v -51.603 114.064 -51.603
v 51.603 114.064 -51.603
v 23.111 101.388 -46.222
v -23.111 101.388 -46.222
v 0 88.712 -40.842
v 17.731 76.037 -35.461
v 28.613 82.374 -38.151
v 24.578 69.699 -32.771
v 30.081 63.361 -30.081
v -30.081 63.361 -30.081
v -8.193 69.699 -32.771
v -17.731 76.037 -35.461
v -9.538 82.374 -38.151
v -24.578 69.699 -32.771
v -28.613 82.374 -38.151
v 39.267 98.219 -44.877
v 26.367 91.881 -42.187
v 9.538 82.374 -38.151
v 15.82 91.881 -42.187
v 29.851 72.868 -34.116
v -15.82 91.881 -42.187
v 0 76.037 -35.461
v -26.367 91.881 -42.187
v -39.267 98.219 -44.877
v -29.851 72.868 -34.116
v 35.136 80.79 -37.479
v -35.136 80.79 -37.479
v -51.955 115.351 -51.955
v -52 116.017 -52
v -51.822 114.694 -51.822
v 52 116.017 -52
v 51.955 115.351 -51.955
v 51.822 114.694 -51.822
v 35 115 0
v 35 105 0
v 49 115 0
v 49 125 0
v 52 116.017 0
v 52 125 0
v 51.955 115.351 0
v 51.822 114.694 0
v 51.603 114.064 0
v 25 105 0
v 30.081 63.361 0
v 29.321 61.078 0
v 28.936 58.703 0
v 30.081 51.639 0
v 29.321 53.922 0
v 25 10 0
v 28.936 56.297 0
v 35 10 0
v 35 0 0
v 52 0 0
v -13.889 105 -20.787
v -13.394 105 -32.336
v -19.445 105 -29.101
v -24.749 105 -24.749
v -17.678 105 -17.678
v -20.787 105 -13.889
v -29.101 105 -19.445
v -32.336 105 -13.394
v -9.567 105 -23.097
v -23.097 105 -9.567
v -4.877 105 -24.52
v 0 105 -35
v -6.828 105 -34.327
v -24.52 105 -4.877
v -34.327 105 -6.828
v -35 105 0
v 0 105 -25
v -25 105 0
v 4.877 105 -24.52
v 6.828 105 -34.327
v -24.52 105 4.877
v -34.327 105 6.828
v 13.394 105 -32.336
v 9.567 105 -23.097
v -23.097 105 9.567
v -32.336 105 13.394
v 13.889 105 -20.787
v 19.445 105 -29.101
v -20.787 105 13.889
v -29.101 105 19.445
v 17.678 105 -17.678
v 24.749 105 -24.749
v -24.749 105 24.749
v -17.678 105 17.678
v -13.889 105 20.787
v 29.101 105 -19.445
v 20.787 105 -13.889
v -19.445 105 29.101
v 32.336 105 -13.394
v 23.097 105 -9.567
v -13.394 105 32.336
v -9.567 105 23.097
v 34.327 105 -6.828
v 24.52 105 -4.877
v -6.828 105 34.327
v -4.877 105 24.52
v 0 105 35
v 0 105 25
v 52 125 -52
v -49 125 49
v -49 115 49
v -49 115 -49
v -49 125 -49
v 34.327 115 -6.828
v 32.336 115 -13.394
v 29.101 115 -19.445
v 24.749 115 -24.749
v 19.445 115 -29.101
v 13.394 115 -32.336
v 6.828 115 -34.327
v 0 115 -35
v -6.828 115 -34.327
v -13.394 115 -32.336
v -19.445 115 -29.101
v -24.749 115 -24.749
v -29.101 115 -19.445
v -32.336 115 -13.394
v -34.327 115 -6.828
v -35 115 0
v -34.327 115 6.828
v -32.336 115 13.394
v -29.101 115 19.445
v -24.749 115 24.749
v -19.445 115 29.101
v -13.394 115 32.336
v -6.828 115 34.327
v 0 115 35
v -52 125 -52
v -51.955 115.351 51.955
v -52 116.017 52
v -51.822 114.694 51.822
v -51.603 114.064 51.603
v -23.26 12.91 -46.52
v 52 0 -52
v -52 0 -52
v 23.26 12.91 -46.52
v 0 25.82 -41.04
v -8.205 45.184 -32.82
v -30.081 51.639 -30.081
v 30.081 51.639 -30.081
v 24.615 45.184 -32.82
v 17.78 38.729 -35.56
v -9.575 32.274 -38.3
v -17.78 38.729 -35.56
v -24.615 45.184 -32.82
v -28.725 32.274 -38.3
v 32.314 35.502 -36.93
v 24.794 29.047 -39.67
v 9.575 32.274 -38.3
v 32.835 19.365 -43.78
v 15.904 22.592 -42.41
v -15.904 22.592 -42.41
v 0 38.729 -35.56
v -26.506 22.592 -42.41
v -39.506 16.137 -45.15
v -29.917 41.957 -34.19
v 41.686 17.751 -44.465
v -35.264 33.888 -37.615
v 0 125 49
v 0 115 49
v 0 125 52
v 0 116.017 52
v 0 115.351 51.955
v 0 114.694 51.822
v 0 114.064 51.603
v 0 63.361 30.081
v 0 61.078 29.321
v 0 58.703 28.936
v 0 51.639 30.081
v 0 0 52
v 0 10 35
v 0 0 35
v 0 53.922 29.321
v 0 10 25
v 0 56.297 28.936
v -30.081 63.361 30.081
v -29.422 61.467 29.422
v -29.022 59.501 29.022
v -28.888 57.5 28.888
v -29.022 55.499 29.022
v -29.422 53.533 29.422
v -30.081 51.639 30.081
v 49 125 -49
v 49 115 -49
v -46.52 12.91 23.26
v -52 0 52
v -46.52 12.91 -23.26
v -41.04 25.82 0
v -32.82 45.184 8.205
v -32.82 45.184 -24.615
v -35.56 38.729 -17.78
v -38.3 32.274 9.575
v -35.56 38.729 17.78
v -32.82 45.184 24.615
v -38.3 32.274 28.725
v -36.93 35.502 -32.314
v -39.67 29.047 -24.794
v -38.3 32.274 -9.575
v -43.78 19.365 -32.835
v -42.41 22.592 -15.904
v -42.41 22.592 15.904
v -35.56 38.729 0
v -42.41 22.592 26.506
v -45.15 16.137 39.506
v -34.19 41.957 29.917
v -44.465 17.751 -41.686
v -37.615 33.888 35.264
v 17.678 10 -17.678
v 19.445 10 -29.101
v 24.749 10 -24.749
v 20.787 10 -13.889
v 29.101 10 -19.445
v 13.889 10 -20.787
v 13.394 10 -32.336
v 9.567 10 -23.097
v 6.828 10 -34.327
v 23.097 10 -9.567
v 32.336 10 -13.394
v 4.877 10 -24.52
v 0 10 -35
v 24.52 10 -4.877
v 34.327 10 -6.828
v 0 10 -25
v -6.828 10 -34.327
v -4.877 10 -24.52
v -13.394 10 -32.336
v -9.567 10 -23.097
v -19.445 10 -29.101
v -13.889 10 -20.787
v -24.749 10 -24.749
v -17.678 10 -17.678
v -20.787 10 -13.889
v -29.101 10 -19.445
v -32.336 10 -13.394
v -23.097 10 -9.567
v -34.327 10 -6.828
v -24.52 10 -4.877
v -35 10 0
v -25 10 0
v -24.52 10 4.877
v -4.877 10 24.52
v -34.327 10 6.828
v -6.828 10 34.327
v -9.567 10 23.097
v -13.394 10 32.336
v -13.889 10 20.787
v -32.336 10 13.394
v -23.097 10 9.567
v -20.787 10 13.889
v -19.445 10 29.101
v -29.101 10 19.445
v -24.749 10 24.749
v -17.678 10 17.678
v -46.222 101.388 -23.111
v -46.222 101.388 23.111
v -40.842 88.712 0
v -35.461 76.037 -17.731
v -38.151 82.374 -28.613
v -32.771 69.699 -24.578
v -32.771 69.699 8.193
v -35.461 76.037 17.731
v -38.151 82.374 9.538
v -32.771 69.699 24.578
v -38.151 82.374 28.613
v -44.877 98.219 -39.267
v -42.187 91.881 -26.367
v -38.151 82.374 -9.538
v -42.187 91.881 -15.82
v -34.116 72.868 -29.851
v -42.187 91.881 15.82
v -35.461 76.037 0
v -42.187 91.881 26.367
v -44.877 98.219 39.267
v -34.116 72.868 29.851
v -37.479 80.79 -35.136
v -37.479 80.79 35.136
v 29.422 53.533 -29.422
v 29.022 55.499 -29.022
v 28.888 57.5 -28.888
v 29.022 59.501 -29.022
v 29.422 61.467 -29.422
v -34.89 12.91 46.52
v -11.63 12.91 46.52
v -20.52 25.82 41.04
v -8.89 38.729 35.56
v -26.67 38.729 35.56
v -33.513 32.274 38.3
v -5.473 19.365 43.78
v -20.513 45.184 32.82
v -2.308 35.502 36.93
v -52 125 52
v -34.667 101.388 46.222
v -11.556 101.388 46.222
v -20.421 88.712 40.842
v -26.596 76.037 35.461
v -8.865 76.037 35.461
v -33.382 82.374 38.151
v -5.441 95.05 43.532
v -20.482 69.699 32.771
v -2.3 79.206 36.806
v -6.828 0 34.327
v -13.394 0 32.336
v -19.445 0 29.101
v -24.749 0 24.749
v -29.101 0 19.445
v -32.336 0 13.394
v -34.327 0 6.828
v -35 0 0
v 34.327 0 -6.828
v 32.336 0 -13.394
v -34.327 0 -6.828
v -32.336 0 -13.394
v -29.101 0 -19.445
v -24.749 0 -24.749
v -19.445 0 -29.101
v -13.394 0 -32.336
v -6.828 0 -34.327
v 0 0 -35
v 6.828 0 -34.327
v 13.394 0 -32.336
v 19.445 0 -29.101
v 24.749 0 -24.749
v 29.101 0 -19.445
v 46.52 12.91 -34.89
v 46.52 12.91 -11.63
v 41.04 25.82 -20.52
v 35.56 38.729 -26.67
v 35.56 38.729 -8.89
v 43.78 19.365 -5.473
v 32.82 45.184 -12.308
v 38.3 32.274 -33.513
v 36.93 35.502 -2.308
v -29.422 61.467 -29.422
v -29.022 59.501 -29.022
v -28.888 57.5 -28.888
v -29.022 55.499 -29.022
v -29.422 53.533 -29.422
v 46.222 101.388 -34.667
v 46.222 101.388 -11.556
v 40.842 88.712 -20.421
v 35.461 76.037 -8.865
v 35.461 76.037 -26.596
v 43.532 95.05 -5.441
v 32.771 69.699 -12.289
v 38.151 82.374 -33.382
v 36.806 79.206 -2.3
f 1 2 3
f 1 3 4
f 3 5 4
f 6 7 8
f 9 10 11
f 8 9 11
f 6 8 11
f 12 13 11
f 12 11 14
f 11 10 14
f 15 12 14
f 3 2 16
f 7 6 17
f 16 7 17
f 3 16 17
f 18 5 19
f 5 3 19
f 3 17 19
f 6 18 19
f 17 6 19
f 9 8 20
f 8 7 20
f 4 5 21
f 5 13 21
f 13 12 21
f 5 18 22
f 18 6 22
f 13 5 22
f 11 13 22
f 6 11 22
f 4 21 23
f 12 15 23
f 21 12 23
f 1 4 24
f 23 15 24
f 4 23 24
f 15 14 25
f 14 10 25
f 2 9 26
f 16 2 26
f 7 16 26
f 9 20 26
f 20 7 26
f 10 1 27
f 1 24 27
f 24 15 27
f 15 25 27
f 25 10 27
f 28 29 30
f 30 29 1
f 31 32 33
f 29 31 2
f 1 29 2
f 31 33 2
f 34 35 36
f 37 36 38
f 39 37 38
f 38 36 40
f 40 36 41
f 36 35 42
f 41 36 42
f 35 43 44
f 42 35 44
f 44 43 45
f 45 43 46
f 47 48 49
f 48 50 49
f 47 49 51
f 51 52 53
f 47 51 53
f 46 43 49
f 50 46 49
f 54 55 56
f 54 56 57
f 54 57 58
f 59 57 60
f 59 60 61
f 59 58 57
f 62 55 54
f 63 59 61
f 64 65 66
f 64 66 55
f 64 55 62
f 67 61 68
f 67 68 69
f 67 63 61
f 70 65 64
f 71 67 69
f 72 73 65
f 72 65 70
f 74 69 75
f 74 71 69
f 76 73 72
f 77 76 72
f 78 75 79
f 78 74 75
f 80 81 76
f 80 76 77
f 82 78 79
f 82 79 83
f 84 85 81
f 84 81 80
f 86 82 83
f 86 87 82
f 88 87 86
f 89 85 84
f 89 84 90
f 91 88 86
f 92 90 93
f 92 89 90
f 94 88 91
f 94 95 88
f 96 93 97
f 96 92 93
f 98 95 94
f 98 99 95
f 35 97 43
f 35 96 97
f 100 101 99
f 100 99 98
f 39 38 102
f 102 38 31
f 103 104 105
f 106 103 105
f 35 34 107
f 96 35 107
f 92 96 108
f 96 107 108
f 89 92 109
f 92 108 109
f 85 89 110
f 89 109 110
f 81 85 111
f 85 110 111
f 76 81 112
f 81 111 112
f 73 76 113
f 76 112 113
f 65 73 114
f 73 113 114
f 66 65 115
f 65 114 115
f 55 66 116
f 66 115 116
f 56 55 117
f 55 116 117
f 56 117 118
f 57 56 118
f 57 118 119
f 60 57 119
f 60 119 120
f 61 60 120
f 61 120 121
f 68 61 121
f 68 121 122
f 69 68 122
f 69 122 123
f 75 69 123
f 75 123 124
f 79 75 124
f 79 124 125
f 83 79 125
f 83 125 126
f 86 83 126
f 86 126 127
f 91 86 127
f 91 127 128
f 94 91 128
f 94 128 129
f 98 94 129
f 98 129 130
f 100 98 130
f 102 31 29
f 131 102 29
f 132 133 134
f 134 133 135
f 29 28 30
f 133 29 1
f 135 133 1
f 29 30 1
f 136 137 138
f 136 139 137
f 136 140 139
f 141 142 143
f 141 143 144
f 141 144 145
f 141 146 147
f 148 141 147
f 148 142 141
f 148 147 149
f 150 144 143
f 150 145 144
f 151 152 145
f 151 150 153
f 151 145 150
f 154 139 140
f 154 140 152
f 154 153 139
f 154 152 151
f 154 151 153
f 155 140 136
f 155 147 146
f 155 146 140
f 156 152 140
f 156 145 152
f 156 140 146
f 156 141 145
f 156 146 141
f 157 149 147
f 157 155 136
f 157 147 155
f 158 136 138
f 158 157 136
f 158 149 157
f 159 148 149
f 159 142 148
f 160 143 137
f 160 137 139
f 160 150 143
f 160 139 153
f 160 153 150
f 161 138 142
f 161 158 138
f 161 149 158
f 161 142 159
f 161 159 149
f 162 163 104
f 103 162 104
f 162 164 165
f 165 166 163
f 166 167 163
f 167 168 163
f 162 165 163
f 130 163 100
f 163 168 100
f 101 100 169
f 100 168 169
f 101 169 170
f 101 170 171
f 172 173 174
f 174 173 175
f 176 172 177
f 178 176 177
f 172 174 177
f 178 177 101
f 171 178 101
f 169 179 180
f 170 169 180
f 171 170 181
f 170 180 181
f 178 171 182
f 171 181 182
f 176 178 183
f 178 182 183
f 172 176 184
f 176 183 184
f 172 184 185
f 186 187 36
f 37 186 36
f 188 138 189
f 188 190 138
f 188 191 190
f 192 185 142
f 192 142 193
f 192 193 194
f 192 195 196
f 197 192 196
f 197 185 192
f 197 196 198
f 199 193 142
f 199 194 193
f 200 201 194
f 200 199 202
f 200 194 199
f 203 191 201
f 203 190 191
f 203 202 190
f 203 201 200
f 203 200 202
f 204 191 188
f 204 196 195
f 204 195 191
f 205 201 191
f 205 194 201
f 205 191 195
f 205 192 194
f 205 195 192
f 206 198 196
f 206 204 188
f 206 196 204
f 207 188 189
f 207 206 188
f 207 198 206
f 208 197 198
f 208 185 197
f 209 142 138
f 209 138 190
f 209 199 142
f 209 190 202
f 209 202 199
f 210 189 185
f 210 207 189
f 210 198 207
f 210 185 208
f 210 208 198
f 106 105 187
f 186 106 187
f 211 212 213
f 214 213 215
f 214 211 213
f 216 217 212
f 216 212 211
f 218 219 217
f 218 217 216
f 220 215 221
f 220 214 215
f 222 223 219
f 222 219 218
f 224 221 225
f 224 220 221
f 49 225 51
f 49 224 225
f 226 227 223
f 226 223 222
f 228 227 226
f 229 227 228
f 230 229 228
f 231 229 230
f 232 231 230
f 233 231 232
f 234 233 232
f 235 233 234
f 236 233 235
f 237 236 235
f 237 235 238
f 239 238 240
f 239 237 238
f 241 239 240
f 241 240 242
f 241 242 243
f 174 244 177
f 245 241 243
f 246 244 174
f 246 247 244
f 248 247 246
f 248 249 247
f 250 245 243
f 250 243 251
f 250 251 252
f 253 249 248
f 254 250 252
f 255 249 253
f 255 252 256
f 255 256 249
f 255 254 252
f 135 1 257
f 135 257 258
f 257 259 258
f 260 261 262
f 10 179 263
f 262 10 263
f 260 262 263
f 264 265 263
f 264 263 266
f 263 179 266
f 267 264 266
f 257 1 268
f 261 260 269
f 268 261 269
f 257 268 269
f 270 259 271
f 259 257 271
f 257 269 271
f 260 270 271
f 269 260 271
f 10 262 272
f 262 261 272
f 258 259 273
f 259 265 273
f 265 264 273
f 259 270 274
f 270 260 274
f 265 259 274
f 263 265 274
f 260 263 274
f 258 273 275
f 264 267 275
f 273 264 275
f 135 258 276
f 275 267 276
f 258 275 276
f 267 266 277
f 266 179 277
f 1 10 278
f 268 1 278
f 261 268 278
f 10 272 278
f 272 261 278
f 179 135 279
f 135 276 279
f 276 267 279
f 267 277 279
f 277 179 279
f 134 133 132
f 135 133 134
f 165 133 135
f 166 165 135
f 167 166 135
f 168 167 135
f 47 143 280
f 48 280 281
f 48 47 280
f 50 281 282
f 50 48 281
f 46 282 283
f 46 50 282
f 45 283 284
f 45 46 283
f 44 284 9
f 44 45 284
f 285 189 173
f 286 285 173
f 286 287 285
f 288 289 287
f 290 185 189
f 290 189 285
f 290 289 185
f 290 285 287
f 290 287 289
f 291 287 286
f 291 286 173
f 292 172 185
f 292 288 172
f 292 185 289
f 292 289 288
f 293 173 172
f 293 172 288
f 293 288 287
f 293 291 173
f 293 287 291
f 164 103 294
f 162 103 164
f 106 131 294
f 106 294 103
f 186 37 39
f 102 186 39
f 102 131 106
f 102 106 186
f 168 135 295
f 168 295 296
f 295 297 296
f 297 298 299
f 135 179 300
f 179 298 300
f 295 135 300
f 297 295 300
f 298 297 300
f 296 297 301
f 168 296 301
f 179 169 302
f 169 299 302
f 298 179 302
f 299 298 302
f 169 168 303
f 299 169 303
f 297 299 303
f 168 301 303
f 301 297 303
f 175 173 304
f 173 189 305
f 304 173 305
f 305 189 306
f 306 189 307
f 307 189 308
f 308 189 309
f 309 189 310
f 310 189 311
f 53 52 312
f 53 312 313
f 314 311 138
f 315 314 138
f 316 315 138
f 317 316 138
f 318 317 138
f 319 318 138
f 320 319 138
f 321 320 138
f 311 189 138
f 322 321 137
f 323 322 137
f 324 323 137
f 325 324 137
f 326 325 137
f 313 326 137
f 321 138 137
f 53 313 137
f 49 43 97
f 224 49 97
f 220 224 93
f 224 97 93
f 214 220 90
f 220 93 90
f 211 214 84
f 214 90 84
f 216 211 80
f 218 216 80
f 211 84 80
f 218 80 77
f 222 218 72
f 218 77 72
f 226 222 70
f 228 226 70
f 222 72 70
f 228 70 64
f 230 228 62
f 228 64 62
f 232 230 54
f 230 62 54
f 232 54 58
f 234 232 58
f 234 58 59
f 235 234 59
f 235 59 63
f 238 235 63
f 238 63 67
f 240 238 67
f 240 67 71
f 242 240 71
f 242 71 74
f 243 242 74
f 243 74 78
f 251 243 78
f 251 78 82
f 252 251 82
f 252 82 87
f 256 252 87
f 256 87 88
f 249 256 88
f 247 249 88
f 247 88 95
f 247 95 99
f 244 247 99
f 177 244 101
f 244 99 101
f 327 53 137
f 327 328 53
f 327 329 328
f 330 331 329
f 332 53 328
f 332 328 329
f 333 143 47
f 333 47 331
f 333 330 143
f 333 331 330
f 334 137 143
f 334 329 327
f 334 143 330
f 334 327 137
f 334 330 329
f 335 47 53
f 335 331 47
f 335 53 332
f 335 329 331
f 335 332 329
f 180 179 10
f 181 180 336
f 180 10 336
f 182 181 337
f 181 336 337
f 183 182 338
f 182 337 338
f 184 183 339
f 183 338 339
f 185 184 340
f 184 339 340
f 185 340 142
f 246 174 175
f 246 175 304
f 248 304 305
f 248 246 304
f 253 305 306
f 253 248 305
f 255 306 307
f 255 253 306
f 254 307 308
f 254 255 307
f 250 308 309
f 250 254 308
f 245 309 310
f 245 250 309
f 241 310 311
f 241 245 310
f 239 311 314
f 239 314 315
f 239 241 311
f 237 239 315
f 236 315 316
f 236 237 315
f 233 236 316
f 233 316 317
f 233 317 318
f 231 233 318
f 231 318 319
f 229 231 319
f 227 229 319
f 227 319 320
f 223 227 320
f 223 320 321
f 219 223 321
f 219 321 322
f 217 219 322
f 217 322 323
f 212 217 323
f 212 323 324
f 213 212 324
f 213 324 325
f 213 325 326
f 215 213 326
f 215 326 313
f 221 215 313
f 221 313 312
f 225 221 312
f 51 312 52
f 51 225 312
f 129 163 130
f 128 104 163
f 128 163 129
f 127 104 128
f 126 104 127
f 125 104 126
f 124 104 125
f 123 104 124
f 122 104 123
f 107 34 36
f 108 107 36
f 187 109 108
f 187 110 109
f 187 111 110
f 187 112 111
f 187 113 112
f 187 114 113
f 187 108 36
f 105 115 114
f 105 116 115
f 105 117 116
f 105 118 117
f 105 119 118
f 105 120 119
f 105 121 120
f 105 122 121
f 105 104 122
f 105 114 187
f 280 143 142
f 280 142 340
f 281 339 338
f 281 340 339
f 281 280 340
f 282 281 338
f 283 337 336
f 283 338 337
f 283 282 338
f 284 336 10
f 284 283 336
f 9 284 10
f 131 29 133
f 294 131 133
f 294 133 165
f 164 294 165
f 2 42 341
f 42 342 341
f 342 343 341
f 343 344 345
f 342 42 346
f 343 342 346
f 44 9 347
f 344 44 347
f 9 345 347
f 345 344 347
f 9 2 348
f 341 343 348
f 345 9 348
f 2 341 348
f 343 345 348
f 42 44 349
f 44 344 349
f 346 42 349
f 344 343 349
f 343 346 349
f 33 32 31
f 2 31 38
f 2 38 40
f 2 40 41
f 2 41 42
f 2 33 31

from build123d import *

# Parameters (mm, degrees)
SKETCH1_W           = 104
SKETCH1_H           = 104
BOSS_EXTRUDE1_DEPTH = 57.5
BOSS_EXTRUDE1_TAPER = 23
SKETCH2_R           = 25
CUT_EXTRUDE2_DEPTH  = 137.502747386
SKETCH3_R           = 35
CUT_EXTRUDE4_DEPTH  = 10
CUT_EXTRUDE5_START  = -10
SKETCH4_R           = 35
CUT_EXTRUDE5_DEPTH  = 10
SKETCH5_W           = 52
SKETCH5_H           = 52
CUT_EXTRUDE6_DEPTH  = 137.502747386
FILLET1_R           = 15
BOSS_EXTRUDE3_DEPTH = 10
FILLET2_R           = 5


with BuildPart() as part:
    # Sketch1 → Boss-Extrude1 (new body)
    with BuildSketch(Plane(origin=(0, 0, 0), x_dir=(1, 0, 0), z_dir=(0, 1, 0))):
        Rectangle(SKETCH1_W, SKETCH1_H)
    extrude(amount=BOSS_EXTRUDE1_DEPTH, taper=BOSS_EXTRUDE1_TAPER)

    # Mirror1: part across plane


with BuildPart() as part_1:
    add(part.part)
    add(part.part.mirror(Plane.ZX.offset(57.5)))

    # Sketch2 → Cut-Extrude2 (cut, through all)
    with BuildSketch(Plane(origin=(0, 115, 0), x_dir=(1, 0, 0), z_dir=(0, 1, 0))):
        with Locations(Location((0, 0, 0), (0, 0, 270))):
            Circle(SKETCH2_R)
    extrude(amount=-CUT_EXTRUDE2_DEPTH, mode=Mode.SUBTRACT)

    # Sketch3 → Cut-Extrude4 (cut)
    with BuildSketch(Plane(origin=(0, 115, 0), x_dir=(1, 0, 0), z_dir=(0, 1, 0))):
        with Locations(Location((0, 0, 0), (0, 0, 270))):
            Circle(SKETCH3_R)
    extrude(amount=-CUT_EXTRUDE4_DEPTH, mode=Mode.SUBTRACT)

    # Sketch4 → Cut-Extrude5 (cut)
    with BuildSketch(Plane.XZ.offset(CUT_EXTRUDE5_START)):
        with Locations(Location((0, 0, 0), (0, 0, 90))):
            Circle(SKETCH4_R)
    extrude(amount=CUT_EXTRUDE5_DEPTH, mode=Mode.SUBTRACT)

    # Sketch5 → Cut-Extrude6 (cut, through all)
    with BuildSketch(Plane(origin=(0, 115, 0), x_dir=(1, 0, 0), z_dir=(0, 1, 0))):
        with Locations((26, -26)):
            Rectangle(SKETCH5_W, SKETCH5_H)
    extrude(amount=-CUT_EXTRUDE6_DEPTH, mode=Mode.SUBTRACT)

    # Fillet1
    # the kernel refuses this fillet: 15 mm, written as the material it adds along each edge
    with BuildSketch(Plane(origin=(43.510503676, 57.5, -27.592698068), x_dir=(0, -0.9205048534524403, -0.3907311284892741), z_dir=(-1, 0, 0))) as fillet1_piece_1_section:
        with BuildLine():
            CenterArc((FILLET1_R * 0.42447481621, -FILLET1_R), FILLET1_R, 90, 46)
            Line((-FILLET1_R * 0.294864984129, -FILLET1_R * 0.305341629541), (0, 0))
            Line((0, 0), (FILLET1_R * 0.42447481621, 0))
        make_face()
    fillet1_piece_1 = extrude(amount=87.021007352, mode=Mode.PRIVATE)
    fillet1_piece_1 = fillet1_piece_1 - Plane(origin=(43.888103729, 57.5, -27.592698068), x_dir=(-0.9205048534524399, -0.39073112848927477, 0), z_dir=(0, 0, 1)) * Cylinder(15, 200, mode=Mode.PRIVATE)
    fillet1_piece_1 = fillet1_piece_1 - Plane(origin=(-43.888103729, 57.5, -27.592698068), x_dir=(0.9205048534524399, -0.3907311284892748, 0), z_dir=(0, 0, -1)) * Cylinder(15, 200, mode=Mode.PRIVATE)
    add(fillet1_piece_1)
    with BuildSketch(Plane(origin=(-27.592698068, 57.5, -43.510503676), x_dir=(-0.3907311284892741, -0.9205048534524403, 0), z_dir=(0, 0, 1))) as fillet1_piece_2_section:
        with BuildLine():
            CenterArc((FILLET1_R * 0.42447481621, -FILLET1_R), FILLET1_R, 90, 46)
            Line((-FILLET1_R * 0.294864984129, -FILLET1_R * 0.305341629541), (0, 0))
            Line((0, 0), (FILLET1_R * 0.42447481621, 0))
        make_face()
    fillet1_piece_2 = extrude(amount=87.021007352, mode=Mode.PRIVATE)
    fillet1_piece_2 = fillet1_piece_2 - Plane(origin=(-27.592698068, 57.5, 43.888103729), x_dir=(0, -0.39073112848927466, -0.9205048534524399), z_dir=(-1, 0, 0)) * Cylinder(15, 200, mode=Mode.PRIVATE)
    fillet1_piece_2 = fillet1_piece_2 - Plane(origin=(-27.592698068, 57.5, -43.888103729), x_dir=(0, -0.39073112848927477, 0.9205048534524399), z_dir=(1, 0, 0)) * Cylinder(15, 200, mode=Mode.PRIVATE)
    add(fillet1_piece_2)
    with BuildSketch(Plane(origin=(-43.510503676, 57.5, 27.592698068), x_dir=(0, -0.9205048534524398, 0.39073112848927505), z_dir=(1, 0, 0))) as fillet1_piece_3_section:
        with BuildLine():
            CenterArc((FILLET1_R * 0.42447481621, -FILLET1_R), FILLET1_R, 90, 46)
            Line((-FILLET1_R * 0.294864984129, -FILLET1_R * 0.305341629541), (0, 0))
            Line((0, 0), (FILLET1_R * 0.42447481621, 0))
        make_face()
    fillet1_piece_3 = extrude(amount=43.510503676, mode=Mode.PRIVATE)
    fillet1_piece_3 = fillet1_piece_3 - Plane(origin=(-43.888103729, 57.5, 27.592698068), x_dir=(0.9205048534524399, -0.3907311284892748, 0), z_dir=(0, 0, -1)) * Cylinder(15, 113, mode=Mode.PRIVATE)
    add(fillet1_piece_3)
    with BuildSketch(Plane(origin=(27.592698068, 57.5, 0), x_dir=(0.3907311284892755, -0.9205048534524396, 0), z_dir=(0, 0, -1))) as fillet1_piece_4_section:
        with BuildLine():
            CenterArc((FILLET1_R * 0.42447481621, -FILLET1_R), FILLET1_R, 90, 46)
            Line((-FILLET1_R * 0.294864984129, -FILLET1_R * 0.305341629541), (0, 0))
            Line((0, 0), (FILLET1_R * 0.42447481621, 0))
        make_face()
    fillet1_piece_4 = extrude(amount=43.510503676, mode=Mode.PRIVATE)
    fillet1_piece_4 = fillet1_piece_4 - Plane(origin=(27.592698068, 57.5, -43.888103729), x_dir=(0, -0.39073112848927477, 0.9205048534524399), z_dir=(1, 0, 0)) * Cylinder(15, 113, mode=Mode.PRIVATE)
    add(fillet1_piece_4)

    # Sketch6 → Boss-Extrude3 (add)
    with BuildSketch(Plane(origin=(0, 115, 0), x_dir=(1, 0, 0), z_dir=(0, 1, 0))):
        Polygon((49, 3), (49, 0), (52, 0), (52, 52), (-52, 52), (-52, -52), (0, -52), (0, -49), (-3, -49), (-49, -49), (-49, 49), (49, 49), align=None)
    extrude(amount=BOSS_EXTRUDE3_DEPTH)

    # Fillet2
    fillet2_edges = [part_1.edges().sort_by_distance(p)[0] for p in [
        (0, 115, -52),
        (-52, 115, 0),
        (-26, 115, 52),
        (52, 115, -26),
    ]]
    fillet(fillet2_edges, radius=FILLET2_R)


solid = part_1.part
